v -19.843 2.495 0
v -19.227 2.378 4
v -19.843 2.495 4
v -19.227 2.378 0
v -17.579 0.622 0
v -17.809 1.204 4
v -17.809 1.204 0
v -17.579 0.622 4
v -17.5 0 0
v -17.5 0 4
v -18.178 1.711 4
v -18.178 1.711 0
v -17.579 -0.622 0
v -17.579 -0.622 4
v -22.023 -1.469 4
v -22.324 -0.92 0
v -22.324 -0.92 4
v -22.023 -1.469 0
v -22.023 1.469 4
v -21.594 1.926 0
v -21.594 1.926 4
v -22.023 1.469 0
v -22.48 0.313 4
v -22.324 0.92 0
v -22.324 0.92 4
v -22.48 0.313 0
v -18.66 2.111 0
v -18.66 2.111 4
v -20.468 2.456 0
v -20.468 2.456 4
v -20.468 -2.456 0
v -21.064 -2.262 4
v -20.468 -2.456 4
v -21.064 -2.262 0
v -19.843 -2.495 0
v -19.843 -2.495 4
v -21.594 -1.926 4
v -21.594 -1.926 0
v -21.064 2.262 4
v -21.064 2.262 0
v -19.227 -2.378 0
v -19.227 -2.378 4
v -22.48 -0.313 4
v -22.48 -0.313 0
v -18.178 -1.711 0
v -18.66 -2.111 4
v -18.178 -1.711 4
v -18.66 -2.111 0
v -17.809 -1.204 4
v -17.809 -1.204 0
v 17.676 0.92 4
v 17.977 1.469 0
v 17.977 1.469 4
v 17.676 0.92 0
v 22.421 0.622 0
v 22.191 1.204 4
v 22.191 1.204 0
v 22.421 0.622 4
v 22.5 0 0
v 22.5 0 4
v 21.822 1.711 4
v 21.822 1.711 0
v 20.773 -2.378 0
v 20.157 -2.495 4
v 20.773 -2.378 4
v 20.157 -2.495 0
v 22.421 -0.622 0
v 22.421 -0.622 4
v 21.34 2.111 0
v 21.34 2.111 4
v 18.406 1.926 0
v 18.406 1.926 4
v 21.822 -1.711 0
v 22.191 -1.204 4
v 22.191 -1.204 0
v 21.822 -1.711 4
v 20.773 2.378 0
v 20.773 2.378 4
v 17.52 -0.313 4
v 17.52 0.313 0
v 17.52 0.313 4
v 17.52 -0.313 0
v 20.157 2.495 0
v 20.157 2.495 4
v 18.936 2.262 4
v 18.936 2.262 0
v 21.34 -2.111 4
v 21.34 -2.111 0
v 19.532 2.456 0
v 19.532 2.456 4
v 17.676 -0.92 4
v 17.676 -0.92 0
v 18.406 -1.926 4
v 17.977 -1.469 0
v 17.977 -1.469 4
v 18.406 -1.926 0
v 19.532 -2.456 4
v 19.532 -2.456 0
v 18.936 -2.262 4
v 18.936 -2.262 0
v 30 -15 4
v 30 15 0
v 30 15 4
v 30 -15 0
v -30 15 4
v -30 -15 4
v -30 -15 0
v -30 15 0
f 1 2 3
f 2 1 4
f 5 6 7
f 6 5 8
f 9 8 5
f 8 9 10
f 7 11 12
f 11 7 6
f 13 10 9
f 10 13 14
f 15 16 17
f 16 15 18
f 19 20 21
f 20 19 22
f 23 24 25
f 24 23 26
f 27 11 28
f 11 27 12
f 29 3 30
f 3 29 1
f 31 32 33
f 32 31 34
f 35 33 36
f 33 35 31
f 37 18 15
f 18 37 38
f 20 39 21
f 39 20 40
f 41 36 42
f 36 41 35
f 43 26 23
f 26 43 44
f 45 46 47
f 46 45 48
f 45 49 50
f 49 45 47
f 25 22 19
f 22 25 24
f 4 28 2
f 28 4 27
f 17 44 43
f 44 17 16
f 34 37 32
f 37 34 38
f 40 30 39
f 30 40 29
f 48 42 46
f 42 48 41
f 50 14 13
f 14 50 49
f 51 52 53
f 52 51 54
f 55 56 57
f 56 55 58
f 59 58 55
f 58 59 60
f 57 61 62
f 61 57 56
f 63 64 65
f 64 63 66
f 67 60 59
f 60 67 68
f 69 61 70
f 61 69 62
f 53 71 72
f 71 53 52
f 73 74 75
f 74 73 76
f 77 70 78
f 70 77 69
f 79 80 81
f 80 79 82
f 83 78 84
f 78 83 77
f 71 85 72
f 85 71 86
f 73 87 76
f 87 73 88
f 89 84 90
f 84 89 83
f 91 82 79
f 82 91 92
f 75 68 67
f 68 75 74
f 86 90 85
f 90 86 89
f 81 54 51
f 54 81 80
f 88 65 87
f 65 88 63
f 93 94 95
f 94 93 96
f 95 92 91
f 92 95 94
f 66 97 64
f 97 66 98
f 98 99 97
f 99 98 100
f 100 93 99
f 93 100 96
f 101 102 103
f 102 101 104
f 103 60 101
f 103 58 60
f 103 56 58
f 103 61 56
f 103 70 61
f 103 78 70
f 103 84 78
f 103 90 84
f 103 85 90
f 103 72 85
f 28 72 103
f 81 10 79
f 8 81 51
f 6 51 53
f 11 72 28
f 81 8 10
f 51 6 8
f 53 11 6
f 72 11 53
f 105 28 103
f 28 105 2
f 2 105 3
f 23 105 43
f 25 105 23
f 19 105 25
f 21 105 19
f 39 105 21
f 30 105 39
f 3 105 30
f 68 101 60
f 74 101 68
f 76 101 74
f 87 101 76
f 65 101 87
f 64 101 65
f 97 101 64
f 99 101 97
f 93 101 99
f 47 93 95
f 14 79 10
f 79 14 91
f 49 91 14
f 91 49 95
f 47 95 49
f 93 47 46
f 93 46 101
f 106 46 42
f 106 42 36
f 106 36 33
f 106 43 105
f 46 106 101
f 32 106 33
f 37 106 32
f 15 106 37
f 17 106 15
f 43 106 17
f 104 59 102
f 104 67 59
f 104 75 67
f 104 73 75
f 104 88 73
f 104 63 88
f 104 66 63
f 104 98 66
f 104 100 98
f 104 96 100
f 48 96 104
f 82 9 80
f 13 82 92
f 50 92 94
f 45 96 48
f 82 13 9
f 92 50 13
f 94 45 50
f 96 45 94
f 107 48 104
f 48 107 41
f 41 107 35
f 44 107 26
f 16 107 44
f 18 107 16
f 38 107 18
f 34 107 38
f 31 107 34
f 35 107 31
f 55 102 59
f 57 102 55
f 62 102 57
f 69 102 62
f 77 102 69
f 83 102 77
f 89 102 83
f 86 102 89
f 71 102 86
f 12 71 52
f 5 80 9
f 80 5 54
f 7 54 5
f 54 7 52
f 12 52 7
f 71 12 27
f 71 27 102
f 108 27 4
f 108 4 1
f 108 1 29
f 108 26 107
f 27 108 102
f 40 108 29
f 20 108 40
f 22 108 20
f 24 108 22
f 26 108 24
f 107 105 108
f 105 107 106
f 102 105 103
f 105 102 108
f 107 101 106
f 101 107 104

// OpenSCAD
// Local CAD workspace export. Units mm. See parameters.csv for evidence.
min_wall=2.0;
// SYNTHETIC TEACHING EXAMPLE: not derived from a real photograph.
// Units: mm. No strength, machine fit, or physical print qualification.
// Preview/render in OpenSCAD; export after reviewing the dimensions.
// Values below are defaults. examples/build_plate.py overrides them with
// openscad -D from plate-parameters.csv, the single parameter source.
plate_length=60.0;
plate_width=30.0;
plate_thickness=4.0;
hole_diameter=5.0;
hole_spacing=40.0;
chord_error=0.02;
radius = hole_diameter / 2;
segments = max(16, ceil(180 / acos(1 - chord_error / radius)));
assert(plate_length > 0 && plate_width > 0 && plate_thickness > 0);
assert(hole_diameter > 0 && hole_spacing > 0);
assert(hole_spacing + hole_diameter < plate_length);
assert(hole_diameter < plate_width);
assert(chord_error > 0 && chord_error < radius);
difference() {
    translate([-plate_length/2, -plate_width/2, 0])
        cube([plate_length, plate_width, plate_thickness]);
    for (x = [-hole_spacing/2, hole_spacing/2])
        translate([x, 0, -0.1])
            cylinder(h=plate_thickness+0.2, d=hole_diameter, $fn=segments);
}

assert(min_wall > 0, "minimum wall must be positive");
assert((plate_length-hole_spacing-hole_diameter)/2 >= min_wall, "end wall below minimum");
assert((plate_width-hole_diameter)/2 >= min_wall, "side wall below minimum");
assert(hole_spacing-hole_diameter >= min_wall, "web below minimum");
